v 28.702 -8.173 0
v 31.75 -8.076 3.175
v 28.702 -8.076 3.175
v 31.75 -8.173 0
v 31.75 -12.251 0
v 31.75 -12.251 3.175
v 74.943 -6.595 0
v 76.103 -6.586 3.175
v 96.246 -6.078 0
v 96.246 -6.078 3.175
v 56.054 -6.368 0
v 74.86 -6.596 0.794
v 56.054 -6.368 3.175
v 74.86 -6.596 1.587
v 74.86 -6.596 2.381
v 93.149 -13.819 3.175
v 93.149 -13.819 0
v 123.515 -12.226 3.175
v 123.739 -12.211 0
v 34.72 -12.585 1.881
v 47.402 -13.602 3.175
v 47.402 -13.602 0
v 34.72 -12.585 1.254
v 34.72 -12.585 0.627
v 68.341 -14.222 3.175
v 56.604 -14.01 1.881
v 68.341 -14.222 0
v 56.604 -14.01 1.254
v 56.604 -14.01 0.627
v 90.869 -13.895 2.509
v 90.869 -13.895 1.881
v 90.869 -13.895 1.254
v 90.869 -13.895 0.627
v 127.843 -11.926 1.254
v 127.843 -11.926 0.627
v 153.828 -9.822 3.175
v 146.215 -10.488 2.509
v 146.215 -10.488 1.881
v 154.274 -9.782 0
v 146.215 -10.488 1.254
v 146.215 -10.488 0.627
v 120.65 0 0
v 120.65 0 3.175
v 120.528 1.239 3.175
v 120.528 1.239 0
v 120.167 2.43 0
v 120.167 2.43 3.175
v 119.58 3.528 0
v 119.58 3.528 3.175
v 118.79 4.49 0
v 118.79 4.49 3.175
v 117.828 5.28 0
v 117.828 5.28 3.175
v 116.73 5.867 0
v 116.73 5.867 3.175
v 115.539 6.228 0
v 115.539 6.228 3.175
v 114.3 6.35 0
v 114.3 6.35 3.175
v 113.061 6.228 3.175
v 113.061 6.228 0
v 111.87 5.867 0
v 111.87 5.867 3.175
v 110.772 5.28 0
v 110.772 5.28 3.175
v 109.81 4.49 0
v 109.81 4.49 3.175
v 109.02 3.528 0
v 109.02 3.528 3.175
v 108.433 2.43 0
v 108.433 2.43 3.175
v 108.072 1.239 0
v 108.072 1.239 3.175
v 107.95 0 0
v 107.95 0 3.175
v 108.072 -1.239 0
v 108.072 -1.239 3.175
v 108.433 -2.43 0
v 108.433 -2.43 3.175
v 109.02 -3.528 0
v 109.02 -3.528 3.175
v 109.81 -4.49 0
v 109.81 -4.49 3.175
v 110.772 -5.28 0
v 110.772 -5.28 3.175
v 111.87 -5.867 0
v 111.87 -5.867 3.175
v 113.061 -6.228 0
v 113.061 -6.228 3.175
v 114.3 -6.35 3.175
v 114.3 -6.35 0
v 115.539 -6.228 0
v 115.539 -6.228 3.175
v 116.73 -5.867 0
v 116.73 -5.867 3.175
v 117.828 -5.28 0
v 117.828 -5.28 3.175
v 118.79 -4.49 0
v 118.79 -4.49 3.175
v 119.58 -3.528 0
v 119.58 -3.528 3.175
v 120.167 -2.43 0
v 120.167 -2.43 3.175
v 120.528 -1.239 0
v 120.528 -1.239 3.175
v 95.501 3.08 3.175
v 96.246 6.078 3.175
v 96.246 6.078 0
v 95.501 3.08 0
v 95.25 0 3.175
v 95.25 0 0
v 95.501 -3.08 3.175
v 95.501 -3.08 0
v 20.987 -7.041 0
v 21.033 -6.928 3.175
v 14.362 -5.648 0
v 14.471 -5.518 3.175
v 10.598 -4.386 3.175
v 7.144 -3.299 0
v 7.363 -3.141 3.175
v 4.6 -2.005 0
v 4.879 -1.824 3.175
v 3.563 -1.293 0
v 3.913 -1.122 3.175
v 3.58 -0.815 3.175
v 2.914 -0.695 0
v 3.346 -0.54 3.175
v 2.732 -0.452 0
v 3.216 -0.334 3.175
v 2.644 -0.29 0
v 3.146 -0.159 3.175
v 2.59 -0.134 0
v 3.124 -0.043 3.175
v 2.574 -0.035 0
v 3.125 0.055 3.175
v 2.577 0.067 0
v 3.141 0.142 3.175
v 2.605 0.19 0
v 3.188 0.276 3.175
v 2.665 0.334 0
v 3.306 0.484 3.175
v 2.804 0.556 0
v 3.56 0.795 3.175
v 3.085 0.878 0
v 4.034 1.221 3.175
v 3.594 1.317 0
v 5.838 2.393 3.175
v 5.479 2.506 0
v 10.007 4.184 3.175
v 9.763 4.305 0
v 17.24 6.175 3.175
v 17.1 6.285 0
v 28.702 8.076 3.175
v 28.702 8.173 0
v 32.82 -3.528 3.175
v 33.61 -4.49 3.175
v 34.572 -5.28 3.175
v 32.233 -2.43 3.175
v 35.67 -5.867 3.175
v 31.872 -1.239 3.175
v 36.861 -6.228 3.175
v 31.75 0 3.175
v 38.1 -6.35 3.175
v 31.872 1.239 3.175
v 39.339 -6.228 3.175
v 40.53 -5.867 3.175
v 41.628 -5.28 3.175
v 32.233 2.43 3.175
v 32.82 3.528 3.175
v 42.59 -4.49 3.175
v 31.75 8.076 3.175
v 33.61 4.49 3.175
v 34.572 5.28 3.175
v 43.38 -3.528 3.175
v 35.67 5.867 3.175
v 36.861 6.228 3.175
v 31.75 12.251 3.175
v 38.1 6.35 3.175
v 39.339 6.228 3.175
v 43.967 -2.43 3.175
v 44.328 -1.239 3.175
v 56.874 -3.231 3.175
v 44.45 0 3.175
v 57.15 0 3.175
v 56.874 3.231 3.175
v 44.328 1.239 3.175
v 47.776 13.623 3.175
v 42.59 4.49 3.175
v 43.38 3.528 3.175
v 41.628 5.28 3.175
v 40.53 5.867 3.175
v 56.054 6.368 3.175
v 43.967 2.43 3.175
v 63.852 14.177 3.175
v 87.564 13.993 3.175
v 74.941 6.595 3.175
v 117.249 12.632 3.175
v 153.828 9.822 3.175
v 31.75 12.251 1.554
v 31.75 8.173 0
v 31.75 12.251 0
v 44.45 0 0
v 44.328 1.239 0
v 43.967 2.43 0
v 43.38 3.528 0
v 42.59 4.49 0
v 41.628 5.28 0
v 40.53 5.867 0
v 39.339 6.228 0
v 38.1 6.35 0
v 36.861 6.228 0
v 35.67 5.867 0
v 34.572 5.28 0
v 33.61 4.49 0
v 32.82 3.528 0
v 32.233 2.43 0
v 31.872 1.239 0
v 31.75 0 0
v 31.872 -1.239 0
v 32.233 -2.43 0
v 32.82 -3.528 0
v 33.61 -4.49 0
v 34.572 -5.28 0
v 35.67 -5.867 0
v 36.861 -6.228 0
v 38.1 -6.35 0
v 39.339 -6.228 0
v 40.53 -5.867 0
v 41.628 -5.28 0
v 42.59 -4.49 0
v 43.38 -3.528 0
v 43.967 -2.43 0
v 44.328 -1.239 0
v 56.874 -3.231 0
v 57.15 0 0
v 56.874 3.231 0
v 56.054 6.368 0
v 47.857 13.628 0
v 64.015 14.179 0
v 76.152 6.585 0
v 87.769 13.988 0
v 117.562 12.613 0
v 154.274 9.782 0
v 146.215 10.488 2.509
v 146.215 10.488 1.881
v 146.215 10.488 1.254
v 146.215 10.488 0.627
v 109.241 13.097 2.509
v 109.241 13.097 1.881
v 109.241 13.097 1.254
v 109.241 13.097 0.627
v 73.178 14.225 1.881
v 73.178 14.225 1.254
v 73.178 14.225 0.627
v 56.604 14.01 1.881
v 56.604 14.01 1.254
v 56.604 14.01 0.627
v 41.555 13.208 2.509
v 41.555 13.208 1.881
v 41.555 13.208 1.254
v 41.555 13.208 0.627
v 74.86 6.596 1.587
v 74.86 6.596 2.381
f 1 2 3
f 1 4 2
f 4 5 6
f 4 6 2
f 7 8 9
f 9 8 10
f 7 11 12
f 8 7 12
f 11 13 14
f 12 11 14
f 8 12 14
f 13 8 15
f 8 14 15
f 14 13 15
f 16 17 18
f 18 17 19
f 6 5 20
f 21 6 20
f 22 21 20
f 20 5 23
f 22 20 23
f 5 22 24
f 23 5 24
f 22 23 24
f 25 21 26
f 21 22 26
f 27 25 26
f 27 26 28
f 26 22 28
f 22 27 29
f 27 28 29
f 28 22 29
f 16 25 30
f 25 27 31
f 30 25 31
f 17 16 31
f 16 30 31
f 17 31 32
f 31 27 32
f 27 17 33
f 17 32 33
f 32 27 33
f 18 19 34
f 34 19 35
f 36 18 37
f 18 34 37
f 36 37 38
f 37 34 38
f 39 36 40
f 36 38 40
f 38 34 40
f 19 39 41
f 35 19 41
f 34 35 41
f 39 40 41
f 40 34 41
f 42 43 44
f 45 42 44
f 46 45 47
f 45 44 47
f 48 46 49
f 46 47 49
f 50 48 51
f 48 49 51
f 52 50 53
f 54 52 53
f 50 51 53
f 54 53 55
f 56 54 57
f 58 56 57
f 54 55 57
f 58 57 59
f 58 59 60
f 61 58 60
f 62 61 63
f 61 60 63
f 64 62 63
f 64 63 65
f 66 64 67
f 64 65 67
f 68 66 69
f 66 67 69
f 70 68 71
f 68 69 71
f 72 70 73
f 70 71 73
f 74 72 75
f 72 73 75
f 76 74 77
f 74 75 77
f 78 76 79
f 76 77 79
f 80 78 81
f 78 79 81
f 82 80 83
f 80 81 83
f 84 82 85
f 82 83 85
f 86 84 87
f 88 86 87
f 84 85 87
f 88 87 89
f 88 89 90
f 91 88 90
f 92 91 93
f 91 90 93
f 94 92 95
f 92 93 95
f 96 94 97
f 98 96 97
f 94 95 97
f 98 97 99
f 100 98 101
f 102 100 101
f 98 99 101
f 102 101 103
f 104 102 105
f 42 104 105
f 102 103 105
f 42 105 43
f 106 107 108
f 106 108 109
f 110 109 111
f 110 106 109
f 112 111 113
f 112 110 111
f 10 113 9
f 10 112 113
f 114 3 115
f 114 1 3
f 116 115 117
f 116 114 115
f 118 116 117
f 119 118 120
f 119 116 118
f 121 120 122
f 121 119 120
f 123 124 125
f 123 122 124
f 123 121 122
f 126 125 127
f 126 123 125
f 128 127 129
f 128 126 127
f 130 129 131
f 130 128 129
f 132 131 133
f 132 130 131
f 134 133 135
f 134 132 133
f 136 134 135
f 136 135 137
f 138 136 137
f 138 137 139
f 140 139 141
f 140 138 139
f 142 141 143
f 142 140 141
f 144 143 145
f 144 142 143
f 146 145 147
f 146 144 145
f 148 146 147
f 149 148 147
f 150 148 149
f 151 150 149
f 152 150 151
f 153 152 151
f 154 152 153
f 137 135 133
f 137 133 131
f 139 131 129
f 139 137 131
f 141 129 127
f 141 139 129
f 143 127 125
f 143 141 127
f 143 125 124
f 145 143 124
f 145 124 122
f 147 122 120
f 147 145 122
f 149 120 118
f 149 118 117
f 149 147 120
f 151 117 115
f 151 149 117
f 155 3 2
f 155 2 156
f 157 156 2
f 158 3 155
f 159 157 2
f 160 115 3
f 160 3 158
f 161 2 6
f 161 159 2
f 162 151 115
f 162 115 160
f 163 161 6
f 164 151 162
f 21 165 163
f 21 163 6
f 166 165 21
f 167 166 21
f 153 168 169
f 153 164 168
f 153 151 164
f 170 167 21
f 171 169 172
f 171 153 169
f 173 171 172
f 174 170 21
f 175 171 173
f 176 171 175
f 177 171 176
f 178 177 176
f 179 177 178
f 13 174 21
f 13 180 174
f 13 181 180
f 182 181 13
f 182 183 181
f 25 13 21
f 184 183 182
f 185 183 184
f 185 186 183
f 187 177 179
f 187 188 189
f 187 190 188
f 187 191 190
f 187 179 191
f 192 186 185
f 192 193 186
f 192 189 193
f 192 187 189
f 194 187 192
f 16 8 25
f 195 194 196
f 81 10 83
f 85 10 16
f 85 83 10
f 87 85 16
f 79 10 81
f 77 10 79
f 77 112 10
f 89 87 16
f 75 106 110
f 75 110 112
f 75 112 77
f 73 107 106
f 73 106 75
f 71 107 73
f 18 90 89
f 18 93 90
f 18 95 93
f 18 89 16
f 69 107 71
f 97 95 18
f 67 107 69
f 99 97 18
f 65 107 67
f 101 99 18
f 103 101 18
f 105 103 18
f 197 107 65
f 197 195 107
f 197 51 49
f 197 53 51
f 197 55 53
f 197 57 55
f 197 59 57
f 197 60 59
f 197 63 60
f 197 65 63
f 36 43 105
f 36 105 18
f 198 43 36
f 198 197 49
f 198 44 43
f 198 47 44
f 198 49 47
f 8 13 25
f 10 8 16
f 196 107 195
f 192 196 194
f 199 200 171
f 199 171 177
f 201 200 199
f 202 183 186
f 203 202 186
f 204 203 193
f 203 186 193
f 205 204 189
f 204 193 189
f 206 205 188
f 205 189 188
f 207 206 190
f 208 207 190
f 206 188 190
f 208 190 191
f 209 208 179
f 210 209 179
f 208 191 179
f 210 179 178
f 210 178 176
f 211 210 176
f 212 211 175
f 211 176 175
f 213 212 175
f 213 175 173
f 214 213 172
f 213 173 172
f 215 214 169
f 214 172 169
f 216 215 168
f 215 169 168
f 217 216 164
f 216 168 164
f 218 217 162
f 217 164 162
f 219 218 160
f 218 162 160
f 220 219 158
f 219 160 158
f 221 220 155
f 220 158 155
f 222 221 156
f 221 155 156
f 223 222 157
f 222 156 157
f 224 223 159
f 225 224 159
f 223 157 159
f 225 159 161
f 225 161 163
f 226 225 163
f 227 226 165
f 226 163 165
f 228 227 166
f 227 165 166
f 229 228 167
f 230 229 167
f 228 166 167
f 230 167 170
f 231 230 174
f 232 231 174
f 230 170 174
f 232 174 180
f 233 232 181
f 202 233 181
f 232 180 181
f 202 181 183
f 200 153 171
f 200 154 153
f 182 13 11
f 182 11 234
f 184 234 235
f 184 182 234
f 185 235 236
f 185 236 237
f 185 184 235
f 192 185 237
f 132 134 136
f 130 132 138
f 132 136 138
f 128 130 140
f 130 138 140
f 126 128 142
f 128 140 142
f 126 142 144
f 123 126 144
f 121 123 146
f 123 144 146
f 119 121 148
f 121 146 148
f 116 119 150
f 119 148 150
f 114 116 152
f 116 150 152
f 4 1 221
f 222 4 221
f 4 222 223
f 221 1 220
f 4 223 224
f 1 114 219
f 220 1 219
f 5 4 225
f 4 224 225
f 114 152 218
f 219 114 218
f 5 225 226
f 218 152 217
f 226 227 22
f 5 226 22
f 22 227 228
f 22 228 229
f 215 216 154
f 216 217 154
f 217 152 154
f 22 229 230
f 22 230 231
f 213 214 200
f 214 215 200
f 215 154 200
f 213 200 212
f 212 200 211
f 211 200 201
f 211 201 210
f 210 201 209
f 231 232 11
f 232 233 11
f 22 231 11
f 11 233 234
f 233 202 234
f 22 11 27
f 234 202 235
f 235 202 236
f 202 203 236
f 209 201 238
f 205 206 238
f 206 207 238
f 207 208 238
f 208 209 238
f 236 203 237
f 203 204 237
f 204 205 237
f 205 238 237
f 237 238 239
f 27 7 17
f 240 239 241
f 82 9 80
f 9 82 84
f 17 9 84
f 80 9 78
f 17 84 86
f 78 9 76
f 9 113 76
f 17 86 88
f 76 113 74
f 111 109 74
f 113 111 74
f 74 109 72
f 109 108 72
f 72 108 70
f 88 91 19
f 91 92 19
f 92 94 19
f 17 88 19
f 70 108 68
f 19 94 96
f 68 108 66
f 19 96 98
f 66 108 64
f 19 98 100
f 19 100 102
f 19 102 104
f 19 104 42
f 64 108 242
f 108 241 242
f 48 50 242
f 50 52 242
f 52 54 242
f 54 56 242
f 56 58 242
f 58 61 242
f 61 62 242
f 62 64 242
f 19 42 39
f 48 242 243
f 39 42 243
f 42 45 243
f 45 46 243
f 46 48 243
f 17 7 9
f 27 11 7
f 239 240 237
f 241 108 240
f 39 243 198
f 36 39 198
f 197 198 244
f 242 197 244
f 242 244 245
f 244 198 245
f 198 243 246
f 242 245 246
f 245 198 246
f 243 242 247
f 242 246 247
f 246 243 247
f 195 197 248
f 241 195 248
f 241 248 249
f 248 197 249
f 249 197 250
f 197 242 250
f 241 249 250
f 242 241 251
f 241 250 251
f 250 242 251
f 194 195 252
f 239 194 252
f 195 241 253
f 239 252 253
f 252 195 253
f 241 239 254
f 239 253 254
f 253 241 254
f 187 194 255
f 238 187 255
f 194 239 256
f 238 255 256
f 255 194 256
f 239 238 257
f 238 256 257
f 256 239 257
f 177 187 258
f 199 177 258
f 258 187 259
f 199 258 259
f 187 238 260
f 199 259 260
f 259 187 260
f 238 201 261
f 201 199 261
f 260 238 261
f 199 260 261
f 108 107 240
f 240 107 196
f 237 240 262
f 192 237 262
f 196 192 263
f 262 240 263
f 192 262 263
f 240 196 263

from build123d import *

# Parameters (mm, degrees)
BOSS_EXTRUDE1_DEPTH     = 3.175
SKETCH2_R               = 6.35
CUT_EXTRUDE1_DEPTH      = 3.175
CUT_EXTRUDE2_DEPTH      = 15.229125104
CUT_EXTRUDE2_DEPTH_BACK = 15.229125104
CUT_EXTRUDE3_DEPTH      = 7.62


with BuildPart() as part:
    # Sketch1 → Boss-Extrude1 (new body)
    with BuildSketch(Plane.XY):
        with BuildLine():
            add(Edge.make_bspline(
                [(237.0836, 0.298725336), (236.995594177, 0.372475408), (236.426976915, 0.302841036), (235.414414738, 0.587878253), (233.557510406, 0.764057302), (231.055978259, 1.142159154), (227.833630131, 1.564095564), (223.947681725, 2.084112793), (219.408243114, 2.671942868), (214.248186401, 3.326415443), (208.497669056, 4.03606524), (202.192664292, 4.791288168), (195.371926847, 5.582717259), (188.077459081, 6.399577403), (180.354259346, 7.2318954), (172.249998357, 8.069333754), (163.814621862, 8.901083193), (155.10015976, 9.715468455), (146.160279484, 10.50179834), (137.050196099, 11.246926821), (127.825887085, 11.938704549), (118.544307176, 12.564288117), (109.262643889, 13.110597113), (100.038037253, 13.563829729), (90.927458146, 13.911900095), (81.986813488, 14.143452851), (73.27135464, 14.247178081), (64.83463449, 14.214844108), (56.728667619, 14.040205364), (49.003349951, 13.718834947), (41.706232299, 13.249892202), (34.882163012, 12.634788148), (28.572900537, 11.878326773), (22.816901851, 10.986944444), (17.649046914, 9.969950888), (13.099625234, 8.838845522), (9.194488598, 7.604658034), (5.953477664, 6.278883166), (3.386928106, 4.870490409), (1.49878923, 3.376700029), (0.289451642, 1.761373844), (-0.134894757, 0), (0.289451642, -1.761373844), (1.49878923, -3.376700029), (3.386928106, -4.870490409), (5.953477664, -6.278883166), (9.194488598, -7.604658034), (13.099625234, -8.838845522), (17.649046914, -9.969950888), (22.816901851, -10.986944444), (28.572900537, -11.878326773), (34.882163012, -12.634788148), (41.706232299, -13.249892202), (49.003349951, -13.718834947), (56.728667619, -14.040205364), (64.83463449, -14.214844108), (73.27135464, -14.247178081), (81.986813488, -14.143452851), (90.927458146, -13.911900095), (100.038037253, -13.563829729), (109.262643889, -13.110597113), (118.544307176, -12.564288117), (127.825887085, -11.938704549), (137.050196099, -11.246926821), (146.160279484, -10.50179834), (155.10015976, -9.715468455), (163.814621862, -8.901083193), (172.249998357, -8.069333754), (180.354259346, -7.2318954), (188.077459081, -6.399577403), (195.371926847, -5.582717259), (202.192664292, -4.791288168), (208.497669056, -4.03606524), (214.248186401, -3.326415443), (219.408243114, -2.671942868), (223.947681725, -2.084112793), (227.833630131, -1.564095564), (231.055978259, -1.142159154), (233.557510406, -0.764057302), (235.414414738, -0.587878253), (236.426976915, -0.302841036), (237.226122795, -0.400706552), (237.226122795, 0.179289302), (237.0836, 0.298725336)],
                knots=[0, 0, 0, 0, 0.000762215, 0.003044706, 0.006832246, 0.012101176, 0.018817536, 0.026939455, 0.036414848, 0.047184629, 0.059180413, 0.072327874, 0.086544061, 0.10174058, 0.117823336, 0.134691452, 0.152240154, 0.17036129, 0.188941008, 0.207865435, 0.227016078, 0.246275696, 0.265524943, 0.284644966, 0.303520118, 0.322034575, 0.340078353, 0.357542593, 0.374325482, 0.390329891, 0.40546389, 0.419643801, 0.432793371, 0.444843817, 0.455737921, 0.465428653, 0.47388632, 0.481101634, 0.487101684, 0.491975368, 0.495930678, 0.499382808, 0.502834938, 0.506790248, 0.511663932, 0.517663982, 0.524879296, 0.533336963, 0.543027695, 0.553921799, 0.565972245, 0.579121815, 0.593301726, 0.608435725, 0.624440134, 0.641223023, 0.658687263, 0.676731041, 0.695245498, 0.71412065, 0.733240673, 0.75248992, 0.771749538, 0.790900181, 0.809824608, 0.828404326, 0.846525462, 0.864074164, 0.88094228, 0.897025036, 0.912221555, 0.926437743, 0.939585203, 0.951580988, 0.962350768, 0.971826161, 0.979948081, 0.98666444, 0.991933371, 0.99572091, 0.998003402, 0.998765616, 1, 1, 1, 1], degree=3))
        make_face()
    extrude(amount=BOSS_EXTRUDE1_DEPTH)

    # Sketch2 → Cut-Extrude1 (cut)
    with BuildSketch(Plane.XY.offset(3.175)):
        with Locations((38.1, 0)):
            Circle(SKETCH2_R)
        with Locations((114.3, 0)):
            Circle(SKETCH2_R)
    extrude(amount=-CUT_EXTRUDE1_DEPTH, mode=Mode.SUBTRACT)

    # Sketch3 → Cut-Extrude2 (cut, two sides)
    with BuildSketch(Plane(origin=(0, 0, 0), x_dir=(1, 0, 0), z_dir=(0, 1, 0))) as cut_extrude2_sk:
        Polygon((154.274292451, 0), (153.827643764, -3.175), (237.190492096, -3.175), (237.190492096, 0), align=None)
    extrude(amount=CUT_EXTRUDE2_DEPTH, mode=Mode.SUBTRACT)
    extrude(cut_extrude2_sk.sketch, amount=-CUT_EXTRUDE2_DEPTH_BACK, mode=Mode.SUBTRACT)

    # Sketch6 → Cut-Loft1 section 0
    with BuildSketch(Plane.XY.offset(3.175)):
        with BuildLine():
            Line((31.75, 8.076408981), (31.75, 11.683250037))
            Line((31.75, 11.683250037), (31.75, 18.395885889))
            Line((31.75, 18.395885889), (-8.998418256, 14.186873402))
            Line((-8.998418256, 14.186873402), (-8.032236021, -19.061162304))
            Line((-8.032236021, -19.061162304), (31.75, -17.664488176))
            Line((31.75, -17.664488176), (31.75, -11.683250037))
            Line((31.75, -11.683250037), (31.75, -8.076408982))
            Line((31.75, -8.076408982), (28.702, -8.076408982))
            add(Edge.make_bspline(
                [(28.702, 8.076408981), (28.062019842, 7.997428017), (26.781360323, 7.83190678), (24.863238423, 7.559576486), (22.952864289, 7.261817641), (21.053229662, 6.936585888), (19.16878625, 6.582266966), (17.301352642, 6.194891801), (15.452394184, 5.770523851), (13.933846318, 5.382610192), (12.734807014, 5.049324169), (11.845778194, 4.787008043), (10.968295358, 4.511299981), (10.104114856, 4.221132537), (9.254625692, 3.915388001), (8.425053114, 3.594578064), (7.620756036, 3.259288164), (6.846465326, 2.908873288), (6.109521351, 2.54404498), (5.415085904, 2.161886878), (4.771732283, 1.761162286), (4.200618093, 1.360175223), (3.806381168, 1.039757171), (3.546177048, 0.785599694), (3.383920596, 0.598121849), (3.254767765, 0.412598836), (3.174243399, 0.254294099), (3.130379566, 0.1138318), (3.117983008, 3.16e-07), (3.130380113, -0.113832551), (3.174242347, -0.254293127), (3.254769825, -0.41260053), (3.383916396, -0.598118576), (3.546175023, -0.785598191), (3.806491944, -1.039841143), (4.20055318, -1.360126113), (4.77176705, -1.761188423), (5.41506381, -2.161870561), (6.109540545, -2.544058683), (6.846443726, -2.908858743), (7.620785984, -3.259307593), (8.424980153, -3.594531648), (9.25458748, -3.915363972), (10.104136109, -4.221145998), (10.968310445, -4.511309444), (11.845765894, -4.787000103), (12.734797781, -5.049319704), (13.933888924, -5.382621972), (15.4523656, -5.770516248), (17.301363518, -6.194894525), (19.168788744, -6.582267832), (21.053210036, -6.936580559), (22.952903047, -7.261827785), (24.863140664, -7.559551063), (26.781311277, -7.831894211), (28.062019842, -7.997428017), (28.702, -8.076408982)],
                knots=[0, 0, 0, 0, 0.03125, 0.0625, 0.09375, 0.125, 0.15625, 0.1875, 0.21875, 0.25, 0.265625, 0.28125, 0.296875, 0.3125, 0.328125, 0.34375, 0.359375, 0.375, 0.390625, 0.40625, 0.421875, 0.4375, 0.453125, 0.4609375, 0.46875, 0.4765625, 0.484375, 0.4921875, 0.5, 0.5078125, 0.515625, 0.5234375, 0.53125, 0.5390625, 0.546875, 0.5625, 0.578125, 0.59375, 0.609375, 0.625, 0.640625, 0.65625, 0.671875, 0.6875, 0.703125, 0.71875, 0.734375, 0.75, 0.78125, 0.8125, 0.84375, 0.875, 0.90625, 0.9375, 0.96875, 1, 1, 1, 1], degree=3))
            Line((28.702, 8.076408981), (31.75, 8.076408981))
        make_face()
    # Sketch5 → Cut-Loft1 section 1
    with BuildSketch(Plane(origin=(0, 0, 0), x_dir=(-1, 0, 0), z_dir=(0, 0, -1))):
        with BuildLine():
            Line((-31.75, -11.773629767), (-31.75, -8.172962021))
            Line((-31.75, -8.172962021), (-28.702, -8.172962021))
            add(Edge.make_bspline(
                [(-28.702, 8.17296202), (-28.04991232, 8.094156153), (-26.745045473, 7.928885379), (-24.790625464, 7.656596528), (-22.843952156, 7.358509388), (-20.907993005, 7.032534185), (-18.987137813, 6.677003012), (-17.083250909, 6.287895965), (-15.197789513, 5.861217163), (-13.648800631, 5.470809812), (-12.425346674, 5.135128731), (-11.518003122, 4.870795331), (-10.622183079, 4.592820857), (-9.739660488, 4.300116815), (-8.871825969, 3.991542258), (-8.023884998, 3.667528855), (-7.201182529, 3.328585226), (-6.408478992, 2.973975846), (-5.653156453, 2.604323149), (-4.940474095, 2.216549268), (-4.279203879, 1.809302193), (-3.690786556, 1.400484278), (-3.283034517, 1.072052932), (-3.013354261, 0.810752852), (-2.845020129, 0.61774711), (-2.710958875, 0.426579544), (-2.627372313, 0.263337315), (-2.58177414, 0.117962243), (-2.568858472, 3.28e-07), (-2.581774708, -0.117963026), (-2.627371214, -0.263336298), (-2.710961028, -0.426581314), (-2.845015751, -0.617743699), (-3.01335214, -0.810751279), (-3.283150094, -1.072140545), (-3.690718878, -1.400433069), (-4.27924005, -1.809329397), (-4.940451244, -2.216532371), (-5.653176086, -2.604337198), (-6.408457303, -2.973961207), (-7.201212263, -3.32860454), (-8.023812968, -3.667483017), (-8.871788374, -3.991518624), (-9.739681391, -4.300130053), (-10.622197985, -4.592830206), (-11.517990976, -4.870787488), (-12.425337452, -5.135124325), (-13.648844495, -5.470821714), (-15.197759965, -5.861209465), (-17.083262354, -6.287898751), (-18.987139884, -6.677003815), (-20.907973868, -7.032528958), (-22.843990245, -7.358519372), (-24.790529171, -7.656571477), (-26.744997097, -7.928872987), (-28.04991232, -8.094156153), (-28.702, -8.172962021)],
                knots=[0, 0, 0, 0, 0.03125, 0.0625, 0.09375, 0.125, 0.15625, 0.1875, 0.21875, 0.25, 0.265625, 0.28125, 0.296875, 0.3125, 0.328125, 0.34375, 0.359375, 0.375, 0.390625, 0.40625, 0.421875, 0.4375, 0.453125, 0.4609375, 0.46875, 0.4765625, 0.484375, 0.4921875, 0.5, 0.5078125, 0.515625, 0.5234375, 0.53125, 0.5390625, 0.546875, 0.5625, 0.578125, 0.59375, 0.609375, 0.625, 0.640625, 0.65625, 0.671875, 0.6875, 0.703125, 0.71875, 0.734375, 0.75, 0.78125, 0.8125, 0.84375, 0.875, 0.90625, 0.9375, 0.96875, 1, 1, 1, 1], degree=3))
            Line((-28.702, 8.17296202), (-31.75, 8.17296202))
            Line((-31.75, 8.17296202), (-31.75, 11.773629767))
            Line((-31.75, 11.773629767), (-31.75, 14.858712547))
            Line((-31.75, 14.858712547), (1.815959964, 11.773629767))
            Line((1.815959964, 11.773629767), (0.454850161, -12.744594259))
            Line((0.454850161, -12.744594259), (-31.75, -15.902369002))
            Line((-31.75, -15.902369002), (-31.75, -11.773629767))
        make_face()
    loft(mode=Mode.SUBTRACT)

    # Sketch7 → Cut-Extrude3 (cut)
    with BuildSketch(Plane.XY.offset(3.175)):
        with BuildLine():
            ThreePointArc((56.054224621, -6.367756139), (57.15, 0), (56.054224621, 6.367756139))
            add(Edge.make_bspline(
                [(96.245779506, 6.07845559), (93.861405197, 6.172308422), (91.477846396, 6.255305153), (84.344598798, 6.468290826), (79.598726683, 6.562324228), (70.121487659, 6.629056545), (65.389943722, 6.602176751), (59.131701158, 6.462519155), (57.592019112, 6.419793098), (56.054224621, 6.367756139)],
                knots=[0.437309704, 0.437309704, 0.437309704, 0.437309704, 0.5, 0.5, 0.625, 0.625, 0.75, 0.75, 0.790835922, 0.790835922, 0.790835922, 0.790835922], degree=3))
            ThreePointArc((96.245779506, 6.07845559), (95.25, 0), (96.245779506, -6.07845559))
            add(Edge.make_bspline(
                [(56.054224621, -6.367756139), (57.592019112, -6.419793098), (59.131701158, -6.462519155), (65.389943722, -6.602176751), (70.121487659, -6.629056545), (79.598726683, -6.562324228), (84.344598798, -6.468290826), (91.477846396, -6.255305153), (93.861405197, -6.172308422), (96.245779506, -6.07845559)],
                knots=[0.209164078, 0.209164078, 0.209164078, 0.209164078, 0.25, 0.25, 0.375, 0.375, 0.5, 0.5, 0.562690296, 0.562690296, 0.562690296, 0.562690296], degree=3))
        make_face()
    extrude(amount=-CUT_EXTRUDE3_DEPTH, mode=Mode.SUBTRACT)


solid = part.part
